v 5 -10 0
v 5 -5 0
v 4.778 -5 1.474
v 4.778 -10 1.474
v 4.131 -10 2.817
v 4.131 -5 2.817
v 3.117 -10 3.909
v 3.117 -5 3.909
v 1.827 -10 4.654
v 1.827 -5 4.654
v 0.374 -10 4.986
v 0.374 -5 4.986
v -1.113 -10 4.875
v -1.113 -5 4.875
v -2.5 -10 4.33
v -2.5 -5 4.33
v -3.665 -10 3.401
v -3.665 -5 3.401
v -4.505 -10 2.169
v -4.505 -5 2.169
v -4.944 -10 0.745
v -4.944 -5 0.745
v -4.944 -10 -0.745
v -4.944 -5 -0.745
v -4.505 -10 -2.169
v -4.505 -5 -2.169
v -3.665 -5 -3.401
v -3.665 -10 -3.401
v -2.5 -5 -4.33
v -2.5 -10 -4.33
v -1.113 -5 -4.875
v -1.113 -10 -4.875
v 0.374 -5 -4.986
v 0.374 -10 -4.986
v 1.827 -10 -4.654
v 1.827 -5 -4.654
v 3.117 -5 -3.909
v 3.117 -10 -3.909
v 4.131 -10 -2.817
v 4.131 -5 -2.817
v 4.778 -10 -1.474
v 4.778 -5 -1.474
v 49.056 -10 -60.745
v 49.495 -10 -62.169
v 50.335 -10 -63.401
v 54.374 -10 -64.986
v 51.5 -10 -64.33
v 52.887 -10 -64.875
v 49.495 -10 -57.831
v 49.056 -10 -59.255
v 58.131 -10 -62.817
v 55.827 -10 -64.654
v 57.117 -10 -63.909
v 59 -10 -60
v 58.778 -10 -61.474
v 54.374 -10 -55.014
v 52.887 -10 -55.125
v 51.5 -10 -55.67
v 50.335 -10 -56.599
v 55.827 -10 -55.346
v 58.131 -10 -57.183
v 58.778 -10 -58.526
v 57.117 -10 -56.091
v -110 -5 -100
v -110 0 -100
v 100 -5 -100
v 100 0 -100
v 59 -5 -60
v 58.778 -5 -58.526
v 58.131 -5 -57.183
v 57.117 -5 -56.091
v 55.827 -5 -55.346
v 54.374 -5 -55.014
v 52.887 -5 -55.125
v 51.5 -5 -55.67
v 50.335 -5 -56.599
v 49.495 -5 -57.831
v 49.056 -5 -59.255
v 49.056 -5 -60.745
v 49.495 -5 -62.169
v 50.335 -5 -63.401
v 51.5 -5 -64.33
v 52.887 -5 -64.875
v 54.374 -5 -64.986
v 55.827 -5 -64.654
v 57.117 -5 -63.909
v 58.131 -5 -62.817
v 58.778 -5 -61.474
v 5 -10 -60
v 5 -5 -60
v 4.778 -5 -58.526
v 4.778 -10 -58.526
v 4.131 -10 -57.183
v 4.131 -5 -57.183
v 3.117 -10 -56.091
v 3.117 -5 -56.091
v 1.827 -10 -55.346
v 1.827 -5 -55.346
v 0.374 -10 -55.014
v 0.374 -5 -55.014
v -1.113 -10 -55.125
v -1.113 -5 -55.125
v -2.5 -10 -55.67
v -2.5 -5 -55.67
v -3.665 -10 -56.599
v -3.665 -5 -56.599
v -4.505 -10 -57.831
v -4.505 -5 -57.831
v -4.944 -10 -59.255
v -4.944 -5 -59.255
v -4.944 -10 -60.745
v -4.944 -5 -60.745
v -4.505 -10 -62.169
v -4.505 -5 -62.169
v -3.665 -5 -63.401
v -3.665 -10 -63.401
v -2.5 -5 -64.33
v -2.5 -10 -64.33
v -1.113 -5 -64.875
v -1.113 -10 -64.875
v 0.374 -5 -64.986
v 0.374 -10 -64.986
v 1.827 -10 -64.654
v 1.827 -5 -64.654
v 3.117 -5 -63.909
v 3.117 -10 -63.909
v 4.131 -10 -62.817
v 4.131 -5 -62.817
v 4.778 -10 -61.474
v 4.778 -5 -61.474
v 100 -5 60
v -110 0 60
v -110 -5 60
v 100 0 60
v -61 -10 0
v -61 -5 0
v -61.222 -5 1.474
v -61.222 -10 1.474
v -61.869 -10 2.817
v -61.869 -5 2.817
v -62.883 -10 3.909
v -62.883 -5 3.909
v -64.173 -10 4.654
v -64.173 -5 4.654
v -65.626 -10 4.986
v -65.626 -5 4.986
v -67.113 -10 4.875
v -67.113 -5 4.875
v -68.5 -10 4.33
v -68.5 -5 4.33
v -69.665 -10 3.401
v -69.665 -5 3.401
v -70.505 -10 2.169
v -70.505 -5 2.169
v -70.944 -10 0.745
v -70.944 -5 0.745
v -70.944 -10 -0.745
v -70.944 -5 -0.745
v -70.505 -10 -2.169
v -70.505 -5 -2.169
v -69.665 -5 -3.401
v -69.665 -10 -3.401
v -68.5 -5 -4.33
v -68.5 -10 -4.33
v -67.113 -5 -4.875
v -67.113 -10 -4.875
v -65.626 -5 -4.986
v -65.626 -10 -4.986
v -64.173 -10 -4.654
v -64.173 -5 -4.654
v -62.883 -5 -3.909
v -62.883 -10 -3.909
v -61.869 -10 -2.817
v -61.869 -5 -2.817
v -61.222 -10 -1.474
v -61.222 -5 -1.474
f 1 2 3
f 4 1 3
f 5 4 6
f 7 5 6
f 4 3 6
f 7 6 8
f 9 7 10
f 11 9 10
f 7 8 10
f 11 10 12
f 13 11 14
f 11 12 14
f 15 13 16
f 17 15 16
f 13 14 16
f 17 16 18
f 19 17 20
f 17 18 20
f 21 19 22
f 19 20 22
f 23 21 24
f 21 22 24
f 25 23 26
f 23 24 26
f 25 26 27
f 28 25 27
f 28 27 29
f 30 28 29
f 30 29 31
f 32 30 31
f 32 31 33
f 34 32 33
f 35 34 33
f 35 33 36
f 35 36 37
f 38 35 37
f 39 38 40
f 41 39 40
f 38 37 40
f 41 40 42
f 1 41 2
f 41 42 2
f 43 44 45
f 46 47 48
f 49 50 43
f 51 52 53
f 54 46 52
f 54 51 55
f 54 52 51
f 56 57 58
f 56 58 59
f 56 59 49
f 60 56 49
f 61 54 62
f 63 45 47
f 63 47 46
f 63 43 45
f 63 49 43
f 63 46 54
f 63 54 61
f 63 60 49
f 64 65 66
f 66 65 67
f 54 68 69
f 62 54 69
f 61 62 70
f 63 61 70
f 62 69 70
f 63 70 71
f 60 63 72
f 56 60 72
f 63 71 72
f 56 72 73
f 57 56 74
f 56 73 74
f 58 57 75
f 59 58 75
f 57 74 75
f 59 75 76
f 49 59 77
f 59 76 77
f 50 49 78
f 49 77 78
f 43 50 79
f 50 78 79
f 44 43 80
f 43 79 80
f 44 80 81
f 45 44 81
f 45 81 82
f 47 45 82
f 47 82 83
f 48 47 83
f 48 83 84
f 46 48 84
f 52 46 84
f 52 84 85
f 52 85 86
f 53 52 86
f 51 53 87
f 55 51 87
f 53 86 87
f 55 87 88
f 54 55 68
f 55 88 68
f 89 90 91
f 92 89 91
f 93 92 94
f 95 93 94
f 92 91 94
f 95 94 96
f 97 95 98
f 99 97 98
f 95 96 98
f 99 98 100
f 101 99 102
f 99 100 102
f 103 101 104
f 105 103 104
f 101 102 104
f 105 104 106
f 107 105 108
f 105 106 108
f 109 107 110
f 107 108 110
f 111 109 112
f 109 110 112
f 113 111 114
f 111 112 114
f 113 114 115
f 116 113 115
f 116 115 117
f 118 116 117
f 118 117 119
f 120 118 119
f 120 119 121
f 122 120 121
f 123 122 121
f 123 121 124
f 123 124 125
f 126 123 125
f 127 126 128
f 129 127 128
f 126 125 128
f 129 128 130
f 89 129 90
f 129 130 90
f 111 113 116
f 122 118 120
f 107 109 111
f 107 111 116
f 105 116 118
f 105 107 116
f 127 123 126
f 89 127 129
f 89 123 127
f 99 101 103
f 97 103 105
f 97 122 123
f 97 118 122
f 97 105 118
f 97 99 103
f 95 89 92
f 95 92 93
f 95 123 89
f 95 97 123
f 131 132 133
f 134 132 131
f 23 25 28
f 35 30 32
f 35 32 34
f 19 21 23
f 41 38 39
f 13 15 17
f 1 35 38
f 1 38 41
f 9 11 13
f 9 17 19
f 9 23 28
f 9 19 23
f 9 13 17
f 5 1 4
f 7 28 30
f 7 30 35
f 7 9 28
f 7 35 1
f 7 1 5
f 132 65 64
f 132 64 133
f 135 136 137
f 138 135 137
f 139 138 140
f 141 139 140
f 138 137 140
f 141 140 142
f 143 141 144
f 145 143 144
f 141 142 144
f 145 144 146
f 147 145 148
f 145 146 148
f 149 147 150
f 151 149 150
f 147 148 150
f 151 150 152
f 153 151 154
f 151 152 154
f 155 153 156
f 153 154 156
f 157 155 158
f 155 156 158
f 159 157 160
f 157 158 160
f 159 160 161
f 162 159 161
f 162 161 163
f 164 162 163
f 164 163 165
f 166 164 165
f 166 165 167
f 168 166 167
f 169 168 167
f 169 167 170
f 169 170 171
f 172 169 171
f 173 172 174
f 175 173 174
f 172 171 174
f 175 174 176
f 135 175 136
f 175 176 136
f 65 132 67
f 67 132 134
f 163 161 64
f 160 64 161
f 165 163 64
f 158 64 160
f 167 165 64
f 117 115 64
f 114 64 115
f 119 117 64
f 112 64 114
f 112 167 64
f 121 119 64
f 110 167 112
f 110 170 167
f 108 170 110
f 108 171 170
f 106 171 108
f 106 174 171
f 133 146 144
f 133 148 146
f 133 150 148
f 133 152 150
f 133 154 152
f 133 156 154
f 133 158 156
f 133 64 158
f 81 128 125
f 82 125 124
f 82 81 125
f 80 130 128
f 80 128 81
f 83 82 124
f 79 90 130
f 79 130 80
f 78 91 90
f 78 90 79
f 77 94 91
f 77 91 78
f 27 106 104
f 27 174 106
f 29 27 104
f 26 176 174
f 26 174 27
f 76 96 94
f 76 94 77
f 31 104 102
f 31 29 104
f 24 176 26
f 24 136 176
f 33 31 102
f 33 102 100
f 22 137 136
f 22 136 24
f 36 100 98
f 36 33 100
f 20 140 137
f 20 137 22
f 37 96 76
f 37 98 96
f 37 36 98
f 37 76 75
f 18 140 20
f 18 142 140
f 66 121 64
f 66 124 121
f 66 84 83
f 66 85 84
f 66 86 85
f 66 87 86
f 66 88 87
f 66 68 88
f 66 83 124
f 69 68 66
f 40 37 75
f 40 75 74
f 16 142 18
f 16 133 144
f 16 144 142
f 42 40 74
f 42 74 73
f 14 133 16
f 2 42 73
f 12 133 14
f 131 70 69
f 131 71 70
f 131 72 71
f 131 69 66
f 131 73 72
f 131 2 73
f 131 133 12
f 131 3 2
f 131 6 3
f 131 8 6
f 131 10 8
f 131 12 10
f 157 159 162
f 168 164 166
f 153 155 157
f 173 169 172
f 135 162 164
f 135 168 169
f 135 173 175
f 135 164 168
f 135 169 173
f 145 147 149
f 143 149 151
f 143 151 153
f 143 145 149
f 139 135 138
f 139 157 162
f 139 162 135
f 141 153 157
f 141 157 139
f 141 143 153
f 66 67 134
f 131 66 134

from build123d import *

# Parameters (mm, degrees)
F0_W     = 210
F0_H     = 160
F1_DEPTH = 5
F2_R     = 5
F3_DEPTH = 5


with BuildPart() as f1:
    # F0 (on Front) → F1 (new body)
    with BuildSketch(Plane.XZ):
        with Locations((-5, -20)):
            Rectangle(F0_W, F0_H)
    extrude(amount=F1_DEPTH)

    # F2 (on face) → F3 (join)
    with BuildSketch(Plane.XZ.offset(5)):
        Circle(F2_R)
        with Locations((0, -60)):
            Circle(F2_R)
        with Locations((54, -60)):
            Circle(F2_R)
        with Locations((-66, 0)):
            Circle(F2_R)
    extrude(amount=F3_DEPTH)


solid = f1.part
